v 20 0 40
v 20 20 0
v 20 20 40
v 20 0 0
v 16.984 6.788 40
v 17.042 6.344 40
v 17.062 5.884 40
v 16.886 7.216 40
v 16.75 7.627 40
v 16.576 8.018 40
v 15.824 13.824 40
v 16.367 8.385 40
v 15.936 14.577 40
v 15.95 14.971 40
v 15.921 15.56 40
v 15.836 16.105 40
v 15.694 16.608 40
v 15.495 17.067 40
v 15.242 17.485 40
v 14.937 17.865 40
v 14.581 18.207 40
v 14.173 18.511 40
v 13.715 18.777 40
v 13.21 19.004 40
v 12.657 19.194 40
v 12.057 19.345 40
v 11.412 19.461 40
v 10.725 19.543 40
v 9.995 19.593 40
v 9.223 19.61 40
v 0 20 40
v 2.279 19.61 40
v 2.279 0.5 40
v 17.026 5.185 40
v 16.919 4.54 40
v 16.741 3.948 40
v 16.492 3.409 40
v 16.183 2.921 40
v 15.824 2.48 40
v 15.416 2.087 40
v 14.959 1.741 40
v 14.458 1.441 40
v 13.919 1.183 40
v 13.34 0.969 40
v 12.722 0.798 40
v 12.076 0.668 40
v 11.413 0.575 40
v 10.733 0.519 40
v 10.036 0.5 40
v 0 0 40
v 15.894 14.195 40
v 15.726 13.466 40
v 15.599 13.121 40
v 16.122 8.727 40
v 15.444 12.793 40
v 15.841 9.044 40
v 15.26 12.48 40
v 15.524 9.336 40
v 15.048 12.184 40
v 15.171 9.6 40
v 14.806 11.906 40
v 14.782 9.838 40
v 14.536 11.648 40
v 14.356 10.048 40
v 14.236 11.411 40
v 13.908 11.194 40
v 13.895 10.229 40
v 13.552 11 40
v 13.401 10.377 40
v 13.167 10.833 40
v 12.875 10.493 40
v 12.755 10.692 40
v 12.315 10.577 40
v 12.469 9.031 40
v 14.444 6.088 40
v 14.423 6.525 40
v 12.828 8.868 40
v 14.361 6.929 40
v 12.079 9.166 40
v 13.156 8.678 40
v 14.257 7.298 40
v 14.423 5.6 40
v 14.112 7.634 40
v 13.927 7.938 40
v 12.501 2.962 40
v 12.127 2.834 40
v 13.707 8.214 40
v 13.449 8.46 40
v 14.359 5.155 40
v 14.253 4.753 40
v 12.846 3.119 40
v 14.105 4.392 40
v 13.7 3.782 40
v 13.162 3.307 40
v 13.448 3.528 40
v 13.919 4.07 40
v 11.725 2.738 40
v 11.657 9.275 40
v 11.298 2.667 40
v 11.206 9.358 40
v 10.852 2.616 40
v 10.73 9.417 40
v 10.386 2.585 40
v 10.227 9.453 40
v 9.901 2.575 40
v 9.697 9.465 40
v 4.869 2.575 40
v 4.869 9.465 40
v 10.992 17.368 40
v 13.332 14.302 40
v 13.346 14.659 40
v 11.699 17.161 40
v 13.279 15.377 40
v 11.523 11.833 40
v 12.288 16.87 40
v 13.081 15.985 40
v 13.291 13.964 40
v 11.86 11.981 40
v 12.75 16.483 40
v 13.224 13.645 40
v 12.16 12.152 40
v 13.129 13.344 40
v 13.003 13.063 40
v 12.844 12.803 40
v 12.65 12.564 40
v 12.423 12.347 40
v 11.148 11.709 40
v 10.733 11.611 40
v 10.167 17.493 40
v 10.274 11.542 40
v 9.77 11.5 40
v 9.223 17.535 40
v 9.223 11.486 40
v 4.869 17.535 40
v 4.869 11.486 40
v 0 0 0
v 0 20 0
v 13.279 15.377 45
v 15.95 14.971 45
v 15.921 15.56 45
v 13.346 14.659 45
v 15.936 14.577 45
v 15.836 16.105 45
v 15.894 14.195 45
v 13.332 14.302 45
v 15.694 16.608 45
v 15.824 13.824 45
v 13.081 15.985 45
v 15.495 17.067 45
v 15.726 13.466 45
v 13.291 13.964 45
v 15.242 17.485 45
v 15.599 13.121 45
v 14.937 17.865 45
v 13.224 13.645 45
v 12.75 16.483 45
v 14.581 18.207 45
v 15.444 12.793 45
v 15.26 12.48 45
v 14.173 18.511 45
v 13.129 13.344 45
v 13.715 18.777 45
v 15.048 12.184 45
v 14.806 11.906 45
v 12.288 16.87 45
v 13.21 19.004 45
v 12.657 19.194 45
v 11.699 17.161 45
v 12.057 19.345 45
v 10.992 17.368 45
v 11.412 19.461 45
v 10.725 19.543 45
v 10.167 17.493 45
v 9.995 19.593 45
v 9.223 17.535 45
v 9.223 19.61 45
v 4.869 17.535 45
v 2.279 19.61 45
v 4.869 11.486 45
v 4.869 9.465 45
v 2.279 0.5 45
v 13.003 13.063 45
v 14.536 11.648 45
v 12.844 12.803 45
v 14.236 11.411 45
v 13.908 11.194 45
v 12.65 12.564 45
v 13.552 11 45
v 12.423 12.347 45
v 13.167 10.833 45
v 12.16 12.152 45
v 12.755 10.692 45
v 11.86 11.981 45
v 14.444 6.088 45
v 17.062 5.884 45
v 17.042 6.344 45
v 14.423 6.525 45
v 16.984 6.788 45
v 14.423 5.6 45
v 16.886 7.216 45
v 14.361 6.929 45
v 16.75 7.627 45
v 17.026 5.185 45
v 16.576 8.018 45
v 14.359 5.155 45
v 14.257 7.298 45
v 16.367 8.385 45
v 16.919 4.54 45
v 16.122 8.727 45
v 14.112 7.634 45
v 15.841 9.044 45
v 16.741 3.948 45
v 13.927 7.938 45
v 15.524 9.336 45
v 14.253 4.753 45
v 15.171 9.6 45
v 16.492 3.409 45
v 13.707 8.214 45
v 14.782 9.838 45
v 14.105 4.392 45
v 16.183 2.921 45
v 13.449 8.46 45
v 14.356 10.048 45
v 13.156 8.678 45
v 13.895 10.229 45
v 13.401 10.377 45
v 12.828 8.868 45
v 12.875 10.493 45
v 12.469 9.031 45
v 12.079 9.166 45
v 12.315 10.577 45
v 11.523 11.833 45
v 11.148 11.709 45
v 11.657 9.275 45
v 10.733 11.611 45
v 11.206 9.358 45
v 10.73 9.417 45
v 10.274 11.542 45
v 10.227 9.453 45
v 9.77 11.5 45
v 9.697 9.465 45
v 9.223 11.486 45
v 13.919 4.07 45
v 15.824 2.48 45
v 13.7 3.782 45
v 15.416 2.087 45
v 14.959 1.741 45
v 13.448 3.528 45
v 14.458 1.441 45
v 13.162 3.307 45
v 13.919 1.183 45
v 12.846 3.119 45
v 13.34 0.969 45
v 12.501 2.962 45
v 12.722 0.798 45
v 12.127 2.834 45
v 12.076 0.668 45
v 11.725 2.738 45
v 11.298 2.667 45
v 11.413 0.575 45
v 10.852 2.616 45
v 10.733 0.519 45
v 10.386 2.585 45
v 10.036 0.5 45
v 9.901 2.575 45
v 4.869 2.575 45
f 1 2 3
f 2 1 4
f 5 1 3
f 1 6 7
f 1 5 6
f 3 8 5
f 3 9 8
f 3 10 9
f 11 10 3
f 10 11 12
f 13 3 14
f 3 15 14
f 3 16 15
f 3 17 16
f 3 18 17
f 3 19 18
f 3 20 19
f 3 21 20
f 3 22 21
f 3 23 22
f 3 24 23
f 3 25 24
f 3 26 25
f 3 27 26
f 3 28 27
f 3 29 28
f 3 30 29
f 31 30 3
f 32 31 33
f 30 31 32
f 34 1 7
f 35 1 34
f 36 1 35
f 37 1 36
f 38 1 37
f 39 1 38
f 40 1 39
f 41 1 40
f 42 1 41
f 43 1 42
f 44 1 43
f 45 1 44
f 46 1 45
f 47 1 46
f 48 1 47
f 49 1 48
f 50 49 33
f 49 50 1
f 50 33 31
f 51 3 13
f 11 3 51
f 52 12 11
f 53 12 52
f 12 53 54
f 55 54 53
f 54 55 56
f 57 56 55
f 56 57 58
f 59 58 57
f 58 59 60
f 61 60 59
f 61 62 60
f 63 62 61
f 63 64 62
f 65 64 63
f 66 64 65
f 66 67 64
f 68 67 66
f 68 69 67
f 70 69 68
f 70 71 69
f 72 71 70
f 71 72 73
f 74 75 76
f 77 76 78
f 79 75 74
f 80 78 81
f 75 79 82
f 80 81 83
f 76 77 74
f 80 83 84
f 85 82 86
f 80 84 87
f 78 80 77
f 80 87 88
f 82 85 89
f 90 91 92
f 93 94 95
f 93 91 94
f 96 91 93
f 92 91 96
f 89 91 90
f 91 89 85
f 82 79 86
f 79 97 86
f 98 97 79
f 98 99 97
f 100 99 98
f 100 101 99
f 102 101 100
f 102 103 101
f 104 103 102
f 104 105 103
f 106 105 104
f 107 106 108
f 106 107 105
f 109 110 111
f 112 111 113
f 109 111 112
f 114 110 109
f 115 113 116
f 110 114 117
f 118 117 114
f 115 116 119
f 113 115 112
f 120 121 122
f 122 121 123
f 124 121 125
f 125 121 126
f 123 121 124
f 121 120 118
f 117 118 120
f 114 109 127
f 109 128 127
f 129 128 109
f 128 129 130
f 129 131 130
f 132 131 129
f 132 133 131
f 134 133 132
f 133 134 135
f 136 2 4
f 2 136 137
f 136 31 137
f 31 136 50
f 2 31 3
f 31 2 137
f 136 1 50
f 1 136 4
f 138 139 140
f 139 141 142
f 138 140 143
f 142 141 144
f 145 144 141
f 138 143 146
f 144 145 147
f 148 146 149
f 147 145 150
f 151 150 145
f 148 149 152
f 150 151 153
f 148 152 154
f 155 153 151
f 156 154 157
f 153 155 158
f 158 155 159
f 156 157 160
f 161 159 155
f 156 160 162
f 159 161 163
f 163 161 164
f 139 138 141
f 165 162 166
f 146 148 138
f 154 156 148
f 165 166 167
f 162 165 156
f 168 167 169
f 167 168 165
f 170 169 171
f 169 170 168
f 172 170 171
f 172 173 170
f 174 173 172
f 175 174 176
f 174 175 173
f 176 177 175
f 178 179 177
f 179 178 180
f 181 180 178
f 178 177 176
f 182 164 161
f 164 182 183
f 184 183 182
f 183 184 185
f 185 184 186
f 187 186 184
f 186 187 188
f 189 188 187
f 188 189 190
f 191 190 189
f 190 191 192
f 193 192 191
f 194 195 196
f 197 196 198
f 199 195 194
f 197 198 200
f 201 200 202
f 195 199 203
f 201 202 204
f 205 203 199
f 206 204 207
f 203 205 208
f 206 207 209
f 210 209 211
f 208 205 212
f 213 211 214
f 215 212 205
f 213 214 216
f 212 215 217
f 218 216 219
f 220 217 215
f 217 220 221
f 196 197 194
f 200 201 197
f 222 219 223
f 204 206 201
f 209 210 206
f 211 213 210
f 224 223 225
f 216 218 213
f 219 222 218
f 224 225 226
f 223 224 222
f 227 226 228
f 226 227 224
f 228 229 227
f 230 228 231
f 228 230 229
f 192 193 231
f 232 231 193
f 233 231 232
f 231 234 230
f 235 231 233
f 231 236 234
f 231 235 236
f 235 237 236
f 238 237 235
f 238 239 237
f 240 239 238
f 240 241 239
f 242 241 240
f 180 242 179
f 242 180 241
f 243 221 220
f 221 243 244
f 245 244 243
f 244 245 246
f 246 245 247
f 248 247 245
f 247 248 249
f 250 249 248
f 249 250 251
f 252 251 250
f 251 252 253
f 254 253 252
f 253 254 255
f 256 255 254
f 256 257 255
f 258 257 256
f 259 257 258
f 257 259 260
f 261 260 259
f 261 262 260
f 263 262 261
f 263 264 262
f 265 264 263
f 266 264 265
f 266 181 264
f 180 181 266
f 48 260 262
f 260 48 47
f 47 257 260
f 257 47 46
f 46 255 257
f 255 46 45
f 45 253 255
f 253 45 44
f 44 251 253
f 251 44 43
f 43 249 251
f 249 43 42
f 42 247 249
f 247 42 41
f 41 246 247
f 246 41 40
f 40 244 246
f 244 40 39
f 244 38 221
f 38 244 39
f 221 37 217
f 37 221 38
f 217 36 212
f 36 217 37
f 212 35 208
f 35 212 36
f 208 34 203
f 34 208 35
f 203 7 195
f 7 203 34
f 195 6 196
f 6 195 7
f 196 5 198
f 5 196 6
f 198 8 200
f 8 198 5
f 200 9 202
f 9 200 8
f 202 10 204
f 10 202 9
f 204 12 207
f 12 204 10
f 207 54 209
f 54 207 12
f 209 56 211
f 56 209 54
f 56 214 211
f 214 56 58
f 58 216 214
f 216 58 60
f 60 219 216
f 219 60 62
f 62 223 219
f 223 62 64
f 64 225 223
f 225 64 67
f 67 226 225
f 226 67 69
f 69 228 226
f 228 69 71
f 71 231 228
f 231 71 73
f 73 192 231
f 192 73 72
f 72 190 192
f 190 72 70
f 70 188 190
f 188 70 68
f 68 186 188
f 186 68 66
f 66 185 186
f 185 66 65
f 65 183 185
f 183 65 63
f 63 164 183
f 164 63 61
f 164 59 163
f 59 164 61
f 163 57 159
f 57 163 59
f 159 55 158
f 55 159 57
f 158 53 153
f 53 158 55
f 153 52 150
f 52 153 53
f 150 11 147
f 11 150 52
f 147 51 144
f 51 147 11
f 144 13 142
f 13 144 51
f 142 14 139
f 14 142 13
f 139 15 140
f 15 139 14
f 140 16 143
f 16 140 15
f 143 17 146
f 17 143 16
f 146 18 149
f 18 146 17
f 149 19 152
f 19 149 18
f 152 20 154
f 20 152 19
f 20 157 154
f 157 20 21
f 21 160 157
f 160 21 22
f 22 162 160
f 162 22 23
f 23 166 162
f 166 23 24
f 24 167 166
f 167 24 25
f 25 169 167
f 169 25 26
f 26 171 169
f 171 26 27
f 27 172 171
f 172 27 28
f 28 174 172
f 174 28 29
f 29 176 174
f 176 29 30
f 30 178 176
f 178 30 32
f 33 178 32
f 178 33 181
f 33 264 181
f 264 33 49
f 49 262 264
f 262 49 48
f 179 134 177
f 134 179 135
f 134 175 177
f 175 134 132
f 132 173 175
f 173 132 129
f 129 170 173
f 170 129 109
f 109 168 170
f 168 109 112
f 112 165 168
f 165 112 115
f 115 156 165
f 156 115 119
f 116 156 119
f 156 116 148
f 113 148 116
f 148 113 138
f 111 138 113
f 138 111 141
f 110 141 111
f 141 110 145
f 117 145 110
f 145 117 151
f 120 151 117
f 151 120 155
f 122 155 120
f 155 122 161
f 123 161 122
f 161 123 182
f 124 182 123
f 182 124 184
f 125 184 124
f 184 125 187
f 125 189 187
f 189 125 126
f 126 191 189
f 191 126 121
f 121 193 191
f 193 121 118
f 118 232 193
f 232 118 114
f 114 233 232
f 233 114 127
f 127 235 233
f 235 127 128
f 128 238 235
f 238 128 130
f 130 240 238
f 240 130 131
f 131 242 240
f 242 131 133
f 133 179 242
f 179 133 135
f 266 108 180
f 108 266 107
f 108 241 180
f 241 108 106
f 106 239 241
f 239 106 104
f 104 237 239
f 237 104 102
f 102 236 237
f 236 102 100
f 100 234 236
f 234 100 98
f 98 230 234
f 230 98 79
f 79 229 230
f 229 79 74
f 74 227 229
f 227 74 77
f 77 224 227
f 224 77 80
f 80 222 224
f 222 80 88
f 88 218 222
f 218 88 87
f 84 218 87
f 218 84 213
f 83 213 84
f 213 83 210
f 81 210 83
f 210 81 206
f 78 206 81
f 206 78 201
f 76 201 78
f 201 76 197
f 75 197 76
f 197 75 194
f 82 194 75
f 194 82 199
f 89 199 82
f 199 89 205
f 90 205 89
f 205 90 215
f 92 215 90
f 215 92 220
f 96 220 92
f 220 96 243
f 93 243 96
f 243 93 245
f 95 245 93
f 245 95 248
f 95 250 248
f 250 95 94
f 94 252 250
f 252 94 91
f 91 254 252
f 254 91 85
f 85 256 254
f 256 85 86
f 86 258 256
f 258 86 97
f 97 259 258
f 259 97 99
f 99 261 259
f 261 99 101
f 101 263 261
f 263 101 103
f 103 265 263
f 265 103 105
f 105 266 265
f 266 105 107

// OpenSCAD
// Letter B, 20x20x40

cube([20,20,40]);
translate([0,.5,40]){
    linear_extrude(5){
        text("B", size=20);
    }
}
